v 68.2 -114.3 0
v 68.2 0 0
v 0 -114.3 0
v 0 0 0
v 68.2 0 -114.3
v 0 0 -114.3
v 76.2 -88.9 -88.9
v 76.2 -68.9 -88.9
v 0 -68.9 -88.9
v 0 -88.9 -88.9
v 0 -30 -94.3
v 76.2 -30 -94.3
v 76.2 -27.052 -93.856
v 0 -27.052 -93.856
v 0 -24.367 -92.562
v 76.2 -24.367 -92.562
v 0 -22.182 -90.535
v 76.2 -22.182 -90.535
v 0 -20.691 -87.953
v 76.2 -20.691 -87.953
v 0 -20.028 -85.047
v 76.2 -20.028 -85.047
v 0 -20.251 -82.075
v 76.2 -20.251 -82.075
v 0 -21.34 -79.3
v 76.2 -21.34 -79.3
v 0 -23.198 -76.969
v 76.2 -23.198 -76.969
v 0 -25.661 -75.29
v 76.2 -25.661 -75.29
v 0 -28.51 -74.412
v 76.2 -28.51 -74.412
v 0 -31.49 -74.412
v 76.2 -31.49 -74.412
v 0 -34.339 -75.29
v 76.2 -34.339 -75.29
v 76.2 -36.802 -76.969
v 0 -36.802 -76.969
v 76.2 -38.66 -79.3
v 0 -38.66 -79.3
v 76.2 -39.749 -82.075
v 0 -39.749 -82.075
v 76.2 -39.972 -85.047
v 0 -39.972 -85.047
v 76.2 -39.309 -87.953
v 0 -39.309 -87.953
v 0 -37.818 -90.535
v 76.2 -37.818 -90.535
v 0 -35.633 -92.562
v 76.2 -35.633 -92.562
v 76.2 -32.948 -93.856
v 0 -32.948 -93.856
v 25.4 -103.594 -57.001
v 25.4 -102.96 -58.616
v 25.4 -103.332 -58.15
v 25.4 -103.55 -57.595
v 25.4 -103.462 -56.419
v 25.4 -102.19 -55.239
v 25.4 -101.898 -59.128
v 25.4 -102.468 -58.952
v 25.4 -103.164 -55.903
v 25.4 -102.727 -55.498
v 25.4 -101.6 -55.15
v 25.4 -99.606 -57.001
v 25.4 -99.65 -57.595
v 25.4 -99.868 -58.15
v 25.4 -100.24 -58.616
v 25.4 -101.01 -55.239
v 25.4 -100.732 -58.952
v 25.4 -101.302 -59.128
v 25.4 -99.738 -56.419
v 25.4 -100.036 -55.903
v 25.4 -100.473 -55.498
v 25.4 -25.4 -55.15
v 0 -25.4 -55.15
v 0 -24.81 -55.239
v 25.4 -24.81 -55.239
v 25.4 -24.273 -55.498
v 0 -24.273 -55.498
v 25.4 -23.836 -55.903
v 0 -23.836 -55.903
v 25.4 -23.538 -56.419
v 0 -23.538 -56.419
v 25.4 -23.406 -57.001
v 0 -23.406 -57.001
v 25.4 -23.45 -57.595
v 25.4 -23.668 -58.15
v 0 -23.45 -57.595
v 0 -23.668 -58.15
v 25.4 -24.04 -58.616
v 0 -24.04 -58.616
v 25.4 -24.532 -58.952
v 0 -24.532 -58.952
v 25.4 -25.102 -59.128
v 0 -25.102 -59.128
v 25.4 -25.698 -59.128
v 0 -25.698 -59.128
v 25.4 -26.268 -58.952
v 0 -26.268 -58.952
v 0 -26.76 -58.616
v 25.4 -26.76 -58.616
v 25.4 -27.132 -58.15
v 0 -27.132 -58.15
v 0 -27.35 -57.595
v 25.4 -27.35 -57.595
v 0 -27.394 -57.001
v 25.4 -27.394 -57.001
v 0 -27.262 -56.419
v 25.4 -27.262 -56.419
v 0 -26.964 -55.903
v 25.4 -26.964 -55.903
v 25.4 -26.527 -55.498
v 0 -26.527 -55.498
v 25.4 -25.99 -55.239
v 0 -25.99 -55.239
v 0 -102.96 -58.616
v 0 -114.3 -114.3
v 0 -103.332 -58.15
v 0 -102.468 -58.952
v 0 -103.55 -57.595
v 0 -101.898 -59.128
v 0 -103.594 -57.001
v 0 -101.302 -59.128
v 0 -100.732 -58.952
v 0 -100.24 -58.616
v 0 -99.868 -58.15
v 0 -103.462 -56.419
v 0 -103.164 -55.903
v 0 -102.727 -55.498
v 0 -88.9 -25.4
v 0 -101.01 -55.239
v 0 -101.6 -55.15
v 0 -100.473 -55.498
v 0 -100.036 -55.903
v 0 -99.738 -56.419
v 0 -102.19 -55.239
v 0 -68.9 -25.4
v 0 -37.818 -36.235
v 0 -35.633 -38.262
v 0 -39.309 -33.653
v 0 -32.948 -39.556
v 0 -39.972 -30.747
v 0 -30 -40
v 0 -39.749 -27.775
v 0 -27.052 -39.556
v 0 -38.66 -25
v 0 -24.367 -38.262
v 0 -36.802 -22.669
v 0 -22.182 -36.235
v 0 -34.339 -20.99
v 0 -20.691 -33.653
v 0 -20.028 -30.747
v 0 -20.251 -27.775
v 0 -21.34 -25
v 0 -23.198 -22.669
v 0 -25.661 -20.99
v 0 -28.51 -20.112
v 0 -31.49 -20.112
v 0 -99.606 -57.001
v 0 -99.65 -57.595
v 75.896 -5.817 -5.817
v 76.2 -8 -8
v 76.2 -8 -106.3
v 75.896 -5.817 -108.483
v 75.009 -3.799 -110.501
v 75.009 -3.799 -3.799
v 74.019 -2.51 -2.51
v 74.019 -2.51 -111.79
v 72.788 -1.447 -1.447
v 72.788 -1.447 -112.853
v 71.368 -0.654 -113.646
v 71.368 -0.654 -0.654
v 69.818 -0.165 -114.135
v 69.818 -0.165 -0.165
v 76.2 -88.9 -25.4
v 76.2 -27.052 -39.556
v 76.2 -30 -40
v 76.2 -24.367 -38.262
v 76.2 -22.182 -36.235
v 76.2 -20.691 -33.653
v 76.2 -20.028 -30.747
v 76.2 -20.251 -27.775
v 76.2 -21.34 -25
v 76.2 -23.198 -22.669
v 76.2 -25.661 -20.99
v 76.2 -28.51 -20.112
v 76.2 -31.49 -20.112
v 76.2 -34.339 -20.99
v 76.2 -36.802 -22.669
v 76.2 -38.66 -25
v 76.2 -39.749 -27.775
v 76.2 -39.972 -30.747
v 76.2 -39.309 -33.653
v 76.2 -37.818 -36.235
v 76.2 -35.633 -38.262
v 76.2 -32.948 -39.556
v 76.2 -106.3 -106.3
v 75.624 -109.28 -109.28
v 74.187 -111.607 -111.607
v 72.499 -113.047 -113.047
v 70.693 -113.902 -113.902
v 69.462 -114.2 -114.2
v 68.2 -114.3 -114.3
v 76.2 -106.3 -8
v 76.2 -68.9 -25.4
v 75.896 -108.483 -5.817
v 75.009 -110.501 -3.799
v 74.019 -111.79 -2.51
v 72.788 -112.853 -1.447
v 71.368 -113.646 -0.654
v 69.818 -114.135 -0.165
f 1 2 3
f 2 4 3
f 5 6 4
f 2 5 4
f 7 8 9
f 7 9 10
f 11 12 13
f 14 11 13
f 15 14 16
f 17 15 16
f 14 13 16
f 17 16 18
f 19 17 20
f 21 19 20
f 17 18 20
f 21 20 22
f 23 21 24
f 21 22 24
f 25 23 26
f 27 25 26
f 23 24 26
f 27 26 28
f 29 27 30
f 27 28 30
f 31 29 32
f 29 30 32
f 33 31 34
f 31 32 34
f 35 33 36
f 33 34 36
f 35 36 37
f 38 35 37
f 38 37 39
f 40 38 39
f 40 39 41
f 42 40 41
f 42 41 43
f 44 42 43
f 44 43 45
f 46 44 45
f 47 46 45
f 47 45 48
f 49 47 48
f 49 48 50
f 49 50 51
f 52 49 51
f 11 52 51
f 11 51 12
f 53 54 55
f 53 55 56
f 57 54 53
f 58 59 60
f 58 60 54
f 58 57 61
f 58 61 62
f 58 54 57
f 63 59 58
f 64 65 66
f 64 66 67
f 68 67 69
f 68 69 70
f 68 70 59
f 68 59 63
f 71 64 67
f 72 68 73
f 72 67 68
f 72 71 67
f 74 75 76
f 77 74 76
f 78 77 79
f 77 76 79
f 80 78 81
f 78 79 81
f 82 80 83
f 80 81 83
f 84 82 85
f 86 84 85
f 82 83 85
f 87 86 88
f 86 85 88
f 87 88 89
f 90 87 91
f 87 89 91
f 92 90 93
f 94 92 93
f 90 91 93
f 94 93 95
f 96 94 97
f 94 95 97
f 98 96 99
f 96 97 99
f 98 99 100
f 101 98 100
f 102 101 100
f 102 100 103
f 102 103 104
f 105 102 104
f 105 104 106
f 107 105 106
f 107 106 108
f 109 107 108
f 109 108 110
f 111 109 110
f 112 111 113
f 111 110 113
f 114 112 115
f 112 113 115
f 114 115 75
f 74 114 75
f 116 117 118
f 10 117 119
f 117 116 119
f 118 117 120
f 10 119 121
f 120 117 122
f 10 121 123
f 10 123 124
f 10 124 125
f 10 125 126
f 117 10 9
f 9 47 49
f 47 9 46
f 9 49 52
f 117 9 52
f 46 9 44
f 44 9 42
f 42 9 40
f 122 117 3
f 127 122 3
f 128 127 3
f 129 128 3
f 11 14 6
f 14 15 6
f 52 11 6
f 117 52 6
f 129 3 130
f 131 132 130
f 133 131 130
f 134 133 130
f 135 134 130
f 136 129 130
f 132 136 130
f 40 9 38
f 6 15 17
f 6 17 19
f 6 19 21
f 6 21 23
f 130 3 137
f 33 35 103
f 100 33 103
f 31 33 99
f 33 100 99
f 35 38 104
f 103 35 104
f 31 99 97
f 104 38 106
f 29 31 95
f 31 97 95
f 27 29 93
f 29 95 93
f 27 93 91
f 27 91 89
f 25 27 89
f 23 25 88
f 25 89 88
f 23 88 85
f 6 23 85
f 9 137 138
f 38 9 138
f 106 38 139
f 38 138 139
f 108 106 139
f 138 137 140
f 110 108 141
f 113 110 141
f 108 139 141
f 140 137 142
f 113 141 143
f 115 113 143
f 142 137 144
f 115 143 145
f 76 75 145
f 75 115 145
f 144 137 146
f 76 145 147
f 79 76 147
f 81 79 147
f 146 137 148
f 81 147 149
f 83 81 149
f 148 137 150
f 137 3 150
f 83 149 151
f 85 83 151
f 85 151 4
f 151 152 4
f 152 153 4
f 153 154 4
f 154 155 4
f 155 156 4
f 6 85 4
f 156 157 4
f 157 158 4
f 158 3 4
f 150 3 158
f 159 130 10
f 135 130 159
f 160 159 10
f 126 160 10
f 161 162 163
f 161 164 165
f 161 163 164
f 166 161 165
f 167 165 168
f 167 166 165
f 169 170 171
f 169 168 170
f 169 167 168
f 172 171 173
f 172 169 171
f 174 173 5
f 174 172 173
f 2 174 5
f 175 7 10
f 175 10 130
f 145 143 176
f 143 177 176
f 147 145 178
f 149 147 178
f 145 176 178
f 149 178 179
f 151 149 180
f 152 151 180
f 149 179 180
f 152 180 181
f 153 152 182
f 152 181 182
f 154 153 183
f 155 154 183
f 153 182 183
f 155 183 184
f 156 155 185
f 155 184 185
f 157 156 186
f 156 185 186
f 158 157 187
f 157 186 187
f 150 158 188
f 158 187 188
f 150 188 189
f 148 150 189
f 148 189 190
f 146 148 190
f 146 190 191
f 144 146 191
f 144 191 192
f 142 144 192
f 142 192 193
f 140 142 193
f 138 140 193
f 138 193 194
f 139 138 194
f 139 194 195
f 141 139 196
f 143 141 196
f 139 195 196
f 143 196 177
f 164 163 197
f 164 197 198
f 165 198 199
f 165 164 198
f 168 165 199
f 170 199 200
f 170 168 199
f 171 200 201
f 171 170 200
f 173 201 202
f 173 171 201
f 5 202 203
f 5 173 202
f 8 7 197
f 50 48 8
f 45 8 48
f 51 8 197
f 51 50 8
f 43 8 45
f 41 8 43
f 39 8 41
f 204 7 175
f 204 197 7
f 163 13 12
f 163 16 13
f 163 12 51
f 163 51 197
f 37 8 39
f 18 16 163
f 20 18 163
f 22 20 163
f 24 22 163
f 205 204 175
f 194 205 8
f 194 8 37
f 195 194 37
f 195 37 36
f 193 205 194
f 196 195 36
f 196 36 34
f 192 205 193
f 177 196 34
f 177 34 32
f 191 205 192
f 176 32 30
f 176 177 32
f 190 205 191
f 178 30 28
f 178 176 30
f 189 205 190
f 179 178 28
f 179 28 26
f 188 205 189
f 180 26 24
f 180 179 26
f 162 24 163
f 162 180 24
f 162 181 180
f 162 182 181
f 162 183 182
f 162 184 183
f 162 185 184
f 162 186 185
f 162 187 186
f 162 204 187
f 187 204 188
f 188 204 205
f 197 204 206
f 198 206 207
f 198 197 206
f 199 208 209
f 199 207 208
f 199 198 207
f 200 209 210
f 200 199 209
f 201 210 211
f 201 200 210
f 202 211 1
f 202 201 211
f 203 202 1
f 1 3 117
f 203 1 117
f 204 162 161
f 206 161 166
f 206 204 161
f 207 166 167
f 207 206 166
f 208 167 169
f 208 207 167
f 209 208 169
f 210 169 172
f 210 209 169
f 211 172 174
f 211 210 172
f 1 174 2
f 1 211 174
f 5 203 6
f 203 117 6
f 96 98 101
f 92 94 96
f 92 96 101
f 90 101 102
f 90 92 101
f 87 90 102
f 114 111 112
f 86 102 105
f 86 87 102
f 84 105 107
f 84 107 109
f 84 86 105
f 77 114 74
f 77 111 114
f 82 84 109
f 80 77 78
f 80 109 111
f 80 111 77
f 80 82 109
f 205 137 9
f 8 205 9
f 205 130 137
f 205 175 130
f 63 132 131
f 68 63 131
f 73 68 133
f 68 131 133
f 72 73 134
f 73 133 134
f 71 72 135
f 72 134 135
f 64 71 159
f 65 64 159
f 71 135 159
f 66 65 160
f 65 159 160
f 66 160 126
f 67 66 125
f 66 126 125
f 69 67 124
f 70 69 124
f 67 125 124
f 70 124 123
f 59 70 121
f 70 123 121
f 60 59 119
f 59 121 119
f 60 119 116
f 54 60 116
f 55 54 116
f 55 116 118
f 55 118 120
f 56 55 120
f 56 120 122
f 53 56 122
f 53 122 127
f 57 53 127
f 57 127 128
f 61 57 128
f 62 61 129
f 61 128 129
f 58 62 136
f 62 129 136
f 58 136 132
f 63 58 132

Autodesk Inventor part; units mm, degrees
ref_plane "YZ Plane" through (0, 0, 0) normal (1, 0, 0) x (0, 1, 0)
ref_plane "XZ Plane" through (0, 0, 0) normal (0, 1, 0) x (-1, 0, 0)
ref_plane "XY Plane" through (0, 0, 0) normal (0, 0, 1) x (1, 0, 0)
sketch "Sketch1" plane through (0, 0, 0) normal (1, 0, 0) x (0, 1, 0)
  line L0 (0, 0) -> (-114.3, 0)
  line L1 (-114.3, 0) -> (-114.3, -114.3)
  line L2 (-114.3, -114.3) -> (0, -114.3)
  line L3 (0, -114.3) -> (0, 0)
  dimension "d0" = 114.3
  dimension "d1" = 114.3
extrude "Extrusion1" add sketch "Sketch1" along normal blind 76.2
sketch "Sketch2" plane through (76.2, 0, 0) normal (1, 0, 0) x (0, 0, -1)
  circle A0 centre (30, -30) radius 10
  circle A1 centre (84.3, -30) radius 10
  line L0 (25.4, -68.9) -> (88.9, -68.9)
  line L1 (88.9, -68.9) -> (88.9, -88.9)
  line L2 (88.9, -88.9) -> (25.4, -88.9)
  line L3 (25.4, -88.9) -> (25.4, -68.9)
  line L4 (114.3, 0) -> (0, 0) projected
  line L5 (114.3, -114.3) -> (114.3, 0) projected
  line L6 (0, 0) -> (0, -114.3) projected
  line L7 (0, -114.3) -> (114.3, -114.3) projected
  dimension "d4" = 20
  dimension "d5" = 20
  dimension "d6" = 63.5
  dimension "d7" = 20
  dimension "d8" = 30
  dimension "d9" = 30
  dimension "d10" = 30
  dimension "d11" = 30
  dimension "d12" = 25.4
  dimension "d13" = 25.4
extrude "Extrusion2" cut sketch "Sketch2" against normal through all contours A0 | A1 | L0 L1 L2 L3
sketch "Sketch3" plane through (76.2, 0, 0) normal (1, 0, 0) x (0, 0, -1)
  point P0 (0, 0)
fillet "Fillet2" radius 8 4 edges at (76.2, -57.15, 0) (76.2, 0, -57.15) (76.2, -114.3, -57.15) (76.2, -57.15, -114.3)
sketch "Sketch4" plane through (76.2, 0, 0) normal (1, 0, 0) x (0, 0, -1)
  point P0 (0, 0)
sketch "Sketch5" plane through (0, 0, 0) normal (-1, 0, 0) x (0, 0, 1)
  circle A0 centre (-57.15, -25.4) radius 2
  circle A1 centre (-57.15, -101.6) radius 2
  line L0 (-114.3, 0) -> (0, 0) projected
  line L1 (0, -114.3) -> (-114.3, -114.3) projected
  line L2 (-114.3, -114.3) -> (-114.3, 0) projected
  dimension "d18" = 4
  dimension "d19" = 4
  dimension "d20" = 25.4
  dimension "d21" = 12.7
  dimension "d22" = 57.15
  dimension "d23" = 57.15
extrude "Extrusion3" cut sketch "Sketch5" against normal blind 25.4
properties part number "face" material "PBT Plastic"
